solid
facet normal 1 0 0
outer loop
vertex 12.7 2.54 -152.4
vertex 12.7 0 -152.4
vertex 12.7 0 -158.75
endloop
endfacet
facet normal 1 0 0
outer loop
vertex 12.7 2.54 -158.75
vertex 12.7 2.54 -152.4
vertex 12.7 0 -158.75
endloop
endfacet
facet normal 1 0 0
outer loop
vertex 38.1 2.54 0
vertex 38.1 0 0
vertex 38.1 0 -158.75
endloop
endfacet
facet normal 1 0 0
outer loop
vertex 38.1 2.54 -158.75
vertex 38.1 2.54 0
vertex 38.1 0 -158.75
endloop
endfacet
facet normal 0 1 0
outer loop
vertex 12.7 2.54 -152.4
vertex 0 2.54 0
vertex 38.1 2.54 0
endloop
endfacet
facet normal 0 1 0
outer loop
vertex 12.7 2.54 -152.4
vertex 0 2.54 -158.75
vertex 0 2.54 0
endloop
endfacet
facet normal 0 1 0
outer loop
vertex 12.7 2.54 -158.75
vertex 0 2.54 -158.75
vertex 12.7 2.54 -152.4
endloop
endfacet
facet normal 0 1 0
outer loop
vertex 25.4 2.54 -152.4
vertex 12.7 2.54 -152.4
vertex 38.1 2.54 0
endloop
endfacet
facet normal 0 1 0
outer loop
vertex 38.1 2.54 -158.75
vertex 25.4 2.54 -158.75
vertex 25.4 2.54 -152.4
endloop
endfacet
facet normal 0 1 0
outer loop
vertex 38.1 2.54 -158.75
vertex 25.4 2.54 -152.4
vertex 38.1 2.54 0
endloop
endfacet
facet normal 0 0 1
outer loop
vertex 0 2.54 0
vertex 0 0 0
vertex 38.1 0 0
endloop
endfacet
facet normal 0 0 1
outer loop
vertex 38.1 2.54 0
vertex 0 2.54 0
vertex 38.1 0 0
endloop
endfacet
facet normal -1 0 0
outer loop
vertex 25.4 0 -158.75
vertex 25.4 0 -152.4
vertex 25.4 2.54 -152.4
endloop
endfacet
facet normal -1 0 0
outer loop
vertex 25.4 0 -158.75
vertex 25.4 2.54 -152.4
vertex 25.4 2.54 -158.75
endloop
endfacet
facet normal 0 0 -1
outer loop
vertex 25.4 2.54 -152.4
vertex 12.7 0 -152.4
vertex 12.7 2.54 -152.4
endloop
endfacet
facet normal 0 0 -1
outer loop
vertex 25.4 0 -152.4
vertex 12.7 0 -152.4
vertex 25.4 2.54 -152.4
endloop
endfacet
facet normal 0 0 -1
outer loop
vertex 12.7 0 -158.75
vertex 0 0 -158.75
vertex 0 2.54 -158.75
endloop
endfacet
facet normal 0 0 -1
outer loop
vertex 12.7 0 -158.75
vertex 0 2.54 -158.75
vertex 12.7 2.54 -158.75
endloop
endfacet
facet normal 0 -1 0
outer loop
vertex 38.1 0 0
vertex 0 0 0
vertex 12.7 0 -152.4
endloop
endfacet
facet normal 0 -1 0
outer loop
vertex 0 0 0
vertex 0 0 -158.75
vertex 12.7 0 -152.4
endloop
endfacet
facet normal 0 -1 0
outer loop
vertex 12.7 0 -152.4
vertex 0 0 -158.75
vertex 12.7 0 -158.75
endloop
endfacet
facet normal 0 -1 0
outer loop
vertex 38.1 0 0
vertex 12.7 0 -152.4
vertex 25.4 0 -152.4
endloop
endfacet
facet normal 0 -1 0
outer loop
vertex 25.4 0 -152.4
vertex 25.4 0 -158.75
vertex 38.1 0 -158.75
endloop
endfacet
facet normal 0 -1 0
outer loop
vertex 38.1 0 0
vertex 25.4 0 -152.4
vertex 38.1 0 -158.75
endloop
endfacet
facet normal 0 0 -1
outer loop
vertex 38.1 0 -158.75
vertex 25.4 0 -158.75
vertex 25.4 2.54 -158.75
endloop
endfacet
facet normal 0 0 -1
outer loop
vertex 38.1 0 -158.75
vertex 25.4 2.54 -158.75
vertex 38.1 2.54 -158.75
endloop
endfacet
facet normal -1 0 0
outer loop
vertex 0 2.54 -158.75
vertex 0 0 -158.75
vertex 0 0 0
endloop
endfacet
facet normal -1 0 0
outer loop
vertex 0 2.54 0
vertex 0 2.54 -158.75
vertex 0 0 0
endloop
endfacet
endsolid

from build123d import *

# Parameters (mm, degrees)
SKETCH1_W           = 38.1
SKETCH1_H           = 152.4
SKETCH1_W_2         = 12.7
SKETCH1_H_2         = 6.35
BOSS_EXTRUDE1_DEPTH = 2.54


with BuildPart() as part:
    # Sketch1 → Boss-Extrude1 (new body)
    with BuildSketch(Plane(origin=(0, 0, 0), x_dir=(1, 0, 0), z_dir=(0, 1, 0))):
        with Locations((19.05, 76.2)):
            Rectangle(SKETCH1_W, SKETCH1_H)
        with Locations((6.35, 155.575)):
            Rectangle(SKETCH1_W_2, SKETCH1_H_2)
        with Locations((31.75, 155.575)):
            Rectangle(SKETCH1_W_2, SKETCH1_H_2)
    extrude(amount=BOSS_EXTRUDE1_DEPTH)


solid = part.part
